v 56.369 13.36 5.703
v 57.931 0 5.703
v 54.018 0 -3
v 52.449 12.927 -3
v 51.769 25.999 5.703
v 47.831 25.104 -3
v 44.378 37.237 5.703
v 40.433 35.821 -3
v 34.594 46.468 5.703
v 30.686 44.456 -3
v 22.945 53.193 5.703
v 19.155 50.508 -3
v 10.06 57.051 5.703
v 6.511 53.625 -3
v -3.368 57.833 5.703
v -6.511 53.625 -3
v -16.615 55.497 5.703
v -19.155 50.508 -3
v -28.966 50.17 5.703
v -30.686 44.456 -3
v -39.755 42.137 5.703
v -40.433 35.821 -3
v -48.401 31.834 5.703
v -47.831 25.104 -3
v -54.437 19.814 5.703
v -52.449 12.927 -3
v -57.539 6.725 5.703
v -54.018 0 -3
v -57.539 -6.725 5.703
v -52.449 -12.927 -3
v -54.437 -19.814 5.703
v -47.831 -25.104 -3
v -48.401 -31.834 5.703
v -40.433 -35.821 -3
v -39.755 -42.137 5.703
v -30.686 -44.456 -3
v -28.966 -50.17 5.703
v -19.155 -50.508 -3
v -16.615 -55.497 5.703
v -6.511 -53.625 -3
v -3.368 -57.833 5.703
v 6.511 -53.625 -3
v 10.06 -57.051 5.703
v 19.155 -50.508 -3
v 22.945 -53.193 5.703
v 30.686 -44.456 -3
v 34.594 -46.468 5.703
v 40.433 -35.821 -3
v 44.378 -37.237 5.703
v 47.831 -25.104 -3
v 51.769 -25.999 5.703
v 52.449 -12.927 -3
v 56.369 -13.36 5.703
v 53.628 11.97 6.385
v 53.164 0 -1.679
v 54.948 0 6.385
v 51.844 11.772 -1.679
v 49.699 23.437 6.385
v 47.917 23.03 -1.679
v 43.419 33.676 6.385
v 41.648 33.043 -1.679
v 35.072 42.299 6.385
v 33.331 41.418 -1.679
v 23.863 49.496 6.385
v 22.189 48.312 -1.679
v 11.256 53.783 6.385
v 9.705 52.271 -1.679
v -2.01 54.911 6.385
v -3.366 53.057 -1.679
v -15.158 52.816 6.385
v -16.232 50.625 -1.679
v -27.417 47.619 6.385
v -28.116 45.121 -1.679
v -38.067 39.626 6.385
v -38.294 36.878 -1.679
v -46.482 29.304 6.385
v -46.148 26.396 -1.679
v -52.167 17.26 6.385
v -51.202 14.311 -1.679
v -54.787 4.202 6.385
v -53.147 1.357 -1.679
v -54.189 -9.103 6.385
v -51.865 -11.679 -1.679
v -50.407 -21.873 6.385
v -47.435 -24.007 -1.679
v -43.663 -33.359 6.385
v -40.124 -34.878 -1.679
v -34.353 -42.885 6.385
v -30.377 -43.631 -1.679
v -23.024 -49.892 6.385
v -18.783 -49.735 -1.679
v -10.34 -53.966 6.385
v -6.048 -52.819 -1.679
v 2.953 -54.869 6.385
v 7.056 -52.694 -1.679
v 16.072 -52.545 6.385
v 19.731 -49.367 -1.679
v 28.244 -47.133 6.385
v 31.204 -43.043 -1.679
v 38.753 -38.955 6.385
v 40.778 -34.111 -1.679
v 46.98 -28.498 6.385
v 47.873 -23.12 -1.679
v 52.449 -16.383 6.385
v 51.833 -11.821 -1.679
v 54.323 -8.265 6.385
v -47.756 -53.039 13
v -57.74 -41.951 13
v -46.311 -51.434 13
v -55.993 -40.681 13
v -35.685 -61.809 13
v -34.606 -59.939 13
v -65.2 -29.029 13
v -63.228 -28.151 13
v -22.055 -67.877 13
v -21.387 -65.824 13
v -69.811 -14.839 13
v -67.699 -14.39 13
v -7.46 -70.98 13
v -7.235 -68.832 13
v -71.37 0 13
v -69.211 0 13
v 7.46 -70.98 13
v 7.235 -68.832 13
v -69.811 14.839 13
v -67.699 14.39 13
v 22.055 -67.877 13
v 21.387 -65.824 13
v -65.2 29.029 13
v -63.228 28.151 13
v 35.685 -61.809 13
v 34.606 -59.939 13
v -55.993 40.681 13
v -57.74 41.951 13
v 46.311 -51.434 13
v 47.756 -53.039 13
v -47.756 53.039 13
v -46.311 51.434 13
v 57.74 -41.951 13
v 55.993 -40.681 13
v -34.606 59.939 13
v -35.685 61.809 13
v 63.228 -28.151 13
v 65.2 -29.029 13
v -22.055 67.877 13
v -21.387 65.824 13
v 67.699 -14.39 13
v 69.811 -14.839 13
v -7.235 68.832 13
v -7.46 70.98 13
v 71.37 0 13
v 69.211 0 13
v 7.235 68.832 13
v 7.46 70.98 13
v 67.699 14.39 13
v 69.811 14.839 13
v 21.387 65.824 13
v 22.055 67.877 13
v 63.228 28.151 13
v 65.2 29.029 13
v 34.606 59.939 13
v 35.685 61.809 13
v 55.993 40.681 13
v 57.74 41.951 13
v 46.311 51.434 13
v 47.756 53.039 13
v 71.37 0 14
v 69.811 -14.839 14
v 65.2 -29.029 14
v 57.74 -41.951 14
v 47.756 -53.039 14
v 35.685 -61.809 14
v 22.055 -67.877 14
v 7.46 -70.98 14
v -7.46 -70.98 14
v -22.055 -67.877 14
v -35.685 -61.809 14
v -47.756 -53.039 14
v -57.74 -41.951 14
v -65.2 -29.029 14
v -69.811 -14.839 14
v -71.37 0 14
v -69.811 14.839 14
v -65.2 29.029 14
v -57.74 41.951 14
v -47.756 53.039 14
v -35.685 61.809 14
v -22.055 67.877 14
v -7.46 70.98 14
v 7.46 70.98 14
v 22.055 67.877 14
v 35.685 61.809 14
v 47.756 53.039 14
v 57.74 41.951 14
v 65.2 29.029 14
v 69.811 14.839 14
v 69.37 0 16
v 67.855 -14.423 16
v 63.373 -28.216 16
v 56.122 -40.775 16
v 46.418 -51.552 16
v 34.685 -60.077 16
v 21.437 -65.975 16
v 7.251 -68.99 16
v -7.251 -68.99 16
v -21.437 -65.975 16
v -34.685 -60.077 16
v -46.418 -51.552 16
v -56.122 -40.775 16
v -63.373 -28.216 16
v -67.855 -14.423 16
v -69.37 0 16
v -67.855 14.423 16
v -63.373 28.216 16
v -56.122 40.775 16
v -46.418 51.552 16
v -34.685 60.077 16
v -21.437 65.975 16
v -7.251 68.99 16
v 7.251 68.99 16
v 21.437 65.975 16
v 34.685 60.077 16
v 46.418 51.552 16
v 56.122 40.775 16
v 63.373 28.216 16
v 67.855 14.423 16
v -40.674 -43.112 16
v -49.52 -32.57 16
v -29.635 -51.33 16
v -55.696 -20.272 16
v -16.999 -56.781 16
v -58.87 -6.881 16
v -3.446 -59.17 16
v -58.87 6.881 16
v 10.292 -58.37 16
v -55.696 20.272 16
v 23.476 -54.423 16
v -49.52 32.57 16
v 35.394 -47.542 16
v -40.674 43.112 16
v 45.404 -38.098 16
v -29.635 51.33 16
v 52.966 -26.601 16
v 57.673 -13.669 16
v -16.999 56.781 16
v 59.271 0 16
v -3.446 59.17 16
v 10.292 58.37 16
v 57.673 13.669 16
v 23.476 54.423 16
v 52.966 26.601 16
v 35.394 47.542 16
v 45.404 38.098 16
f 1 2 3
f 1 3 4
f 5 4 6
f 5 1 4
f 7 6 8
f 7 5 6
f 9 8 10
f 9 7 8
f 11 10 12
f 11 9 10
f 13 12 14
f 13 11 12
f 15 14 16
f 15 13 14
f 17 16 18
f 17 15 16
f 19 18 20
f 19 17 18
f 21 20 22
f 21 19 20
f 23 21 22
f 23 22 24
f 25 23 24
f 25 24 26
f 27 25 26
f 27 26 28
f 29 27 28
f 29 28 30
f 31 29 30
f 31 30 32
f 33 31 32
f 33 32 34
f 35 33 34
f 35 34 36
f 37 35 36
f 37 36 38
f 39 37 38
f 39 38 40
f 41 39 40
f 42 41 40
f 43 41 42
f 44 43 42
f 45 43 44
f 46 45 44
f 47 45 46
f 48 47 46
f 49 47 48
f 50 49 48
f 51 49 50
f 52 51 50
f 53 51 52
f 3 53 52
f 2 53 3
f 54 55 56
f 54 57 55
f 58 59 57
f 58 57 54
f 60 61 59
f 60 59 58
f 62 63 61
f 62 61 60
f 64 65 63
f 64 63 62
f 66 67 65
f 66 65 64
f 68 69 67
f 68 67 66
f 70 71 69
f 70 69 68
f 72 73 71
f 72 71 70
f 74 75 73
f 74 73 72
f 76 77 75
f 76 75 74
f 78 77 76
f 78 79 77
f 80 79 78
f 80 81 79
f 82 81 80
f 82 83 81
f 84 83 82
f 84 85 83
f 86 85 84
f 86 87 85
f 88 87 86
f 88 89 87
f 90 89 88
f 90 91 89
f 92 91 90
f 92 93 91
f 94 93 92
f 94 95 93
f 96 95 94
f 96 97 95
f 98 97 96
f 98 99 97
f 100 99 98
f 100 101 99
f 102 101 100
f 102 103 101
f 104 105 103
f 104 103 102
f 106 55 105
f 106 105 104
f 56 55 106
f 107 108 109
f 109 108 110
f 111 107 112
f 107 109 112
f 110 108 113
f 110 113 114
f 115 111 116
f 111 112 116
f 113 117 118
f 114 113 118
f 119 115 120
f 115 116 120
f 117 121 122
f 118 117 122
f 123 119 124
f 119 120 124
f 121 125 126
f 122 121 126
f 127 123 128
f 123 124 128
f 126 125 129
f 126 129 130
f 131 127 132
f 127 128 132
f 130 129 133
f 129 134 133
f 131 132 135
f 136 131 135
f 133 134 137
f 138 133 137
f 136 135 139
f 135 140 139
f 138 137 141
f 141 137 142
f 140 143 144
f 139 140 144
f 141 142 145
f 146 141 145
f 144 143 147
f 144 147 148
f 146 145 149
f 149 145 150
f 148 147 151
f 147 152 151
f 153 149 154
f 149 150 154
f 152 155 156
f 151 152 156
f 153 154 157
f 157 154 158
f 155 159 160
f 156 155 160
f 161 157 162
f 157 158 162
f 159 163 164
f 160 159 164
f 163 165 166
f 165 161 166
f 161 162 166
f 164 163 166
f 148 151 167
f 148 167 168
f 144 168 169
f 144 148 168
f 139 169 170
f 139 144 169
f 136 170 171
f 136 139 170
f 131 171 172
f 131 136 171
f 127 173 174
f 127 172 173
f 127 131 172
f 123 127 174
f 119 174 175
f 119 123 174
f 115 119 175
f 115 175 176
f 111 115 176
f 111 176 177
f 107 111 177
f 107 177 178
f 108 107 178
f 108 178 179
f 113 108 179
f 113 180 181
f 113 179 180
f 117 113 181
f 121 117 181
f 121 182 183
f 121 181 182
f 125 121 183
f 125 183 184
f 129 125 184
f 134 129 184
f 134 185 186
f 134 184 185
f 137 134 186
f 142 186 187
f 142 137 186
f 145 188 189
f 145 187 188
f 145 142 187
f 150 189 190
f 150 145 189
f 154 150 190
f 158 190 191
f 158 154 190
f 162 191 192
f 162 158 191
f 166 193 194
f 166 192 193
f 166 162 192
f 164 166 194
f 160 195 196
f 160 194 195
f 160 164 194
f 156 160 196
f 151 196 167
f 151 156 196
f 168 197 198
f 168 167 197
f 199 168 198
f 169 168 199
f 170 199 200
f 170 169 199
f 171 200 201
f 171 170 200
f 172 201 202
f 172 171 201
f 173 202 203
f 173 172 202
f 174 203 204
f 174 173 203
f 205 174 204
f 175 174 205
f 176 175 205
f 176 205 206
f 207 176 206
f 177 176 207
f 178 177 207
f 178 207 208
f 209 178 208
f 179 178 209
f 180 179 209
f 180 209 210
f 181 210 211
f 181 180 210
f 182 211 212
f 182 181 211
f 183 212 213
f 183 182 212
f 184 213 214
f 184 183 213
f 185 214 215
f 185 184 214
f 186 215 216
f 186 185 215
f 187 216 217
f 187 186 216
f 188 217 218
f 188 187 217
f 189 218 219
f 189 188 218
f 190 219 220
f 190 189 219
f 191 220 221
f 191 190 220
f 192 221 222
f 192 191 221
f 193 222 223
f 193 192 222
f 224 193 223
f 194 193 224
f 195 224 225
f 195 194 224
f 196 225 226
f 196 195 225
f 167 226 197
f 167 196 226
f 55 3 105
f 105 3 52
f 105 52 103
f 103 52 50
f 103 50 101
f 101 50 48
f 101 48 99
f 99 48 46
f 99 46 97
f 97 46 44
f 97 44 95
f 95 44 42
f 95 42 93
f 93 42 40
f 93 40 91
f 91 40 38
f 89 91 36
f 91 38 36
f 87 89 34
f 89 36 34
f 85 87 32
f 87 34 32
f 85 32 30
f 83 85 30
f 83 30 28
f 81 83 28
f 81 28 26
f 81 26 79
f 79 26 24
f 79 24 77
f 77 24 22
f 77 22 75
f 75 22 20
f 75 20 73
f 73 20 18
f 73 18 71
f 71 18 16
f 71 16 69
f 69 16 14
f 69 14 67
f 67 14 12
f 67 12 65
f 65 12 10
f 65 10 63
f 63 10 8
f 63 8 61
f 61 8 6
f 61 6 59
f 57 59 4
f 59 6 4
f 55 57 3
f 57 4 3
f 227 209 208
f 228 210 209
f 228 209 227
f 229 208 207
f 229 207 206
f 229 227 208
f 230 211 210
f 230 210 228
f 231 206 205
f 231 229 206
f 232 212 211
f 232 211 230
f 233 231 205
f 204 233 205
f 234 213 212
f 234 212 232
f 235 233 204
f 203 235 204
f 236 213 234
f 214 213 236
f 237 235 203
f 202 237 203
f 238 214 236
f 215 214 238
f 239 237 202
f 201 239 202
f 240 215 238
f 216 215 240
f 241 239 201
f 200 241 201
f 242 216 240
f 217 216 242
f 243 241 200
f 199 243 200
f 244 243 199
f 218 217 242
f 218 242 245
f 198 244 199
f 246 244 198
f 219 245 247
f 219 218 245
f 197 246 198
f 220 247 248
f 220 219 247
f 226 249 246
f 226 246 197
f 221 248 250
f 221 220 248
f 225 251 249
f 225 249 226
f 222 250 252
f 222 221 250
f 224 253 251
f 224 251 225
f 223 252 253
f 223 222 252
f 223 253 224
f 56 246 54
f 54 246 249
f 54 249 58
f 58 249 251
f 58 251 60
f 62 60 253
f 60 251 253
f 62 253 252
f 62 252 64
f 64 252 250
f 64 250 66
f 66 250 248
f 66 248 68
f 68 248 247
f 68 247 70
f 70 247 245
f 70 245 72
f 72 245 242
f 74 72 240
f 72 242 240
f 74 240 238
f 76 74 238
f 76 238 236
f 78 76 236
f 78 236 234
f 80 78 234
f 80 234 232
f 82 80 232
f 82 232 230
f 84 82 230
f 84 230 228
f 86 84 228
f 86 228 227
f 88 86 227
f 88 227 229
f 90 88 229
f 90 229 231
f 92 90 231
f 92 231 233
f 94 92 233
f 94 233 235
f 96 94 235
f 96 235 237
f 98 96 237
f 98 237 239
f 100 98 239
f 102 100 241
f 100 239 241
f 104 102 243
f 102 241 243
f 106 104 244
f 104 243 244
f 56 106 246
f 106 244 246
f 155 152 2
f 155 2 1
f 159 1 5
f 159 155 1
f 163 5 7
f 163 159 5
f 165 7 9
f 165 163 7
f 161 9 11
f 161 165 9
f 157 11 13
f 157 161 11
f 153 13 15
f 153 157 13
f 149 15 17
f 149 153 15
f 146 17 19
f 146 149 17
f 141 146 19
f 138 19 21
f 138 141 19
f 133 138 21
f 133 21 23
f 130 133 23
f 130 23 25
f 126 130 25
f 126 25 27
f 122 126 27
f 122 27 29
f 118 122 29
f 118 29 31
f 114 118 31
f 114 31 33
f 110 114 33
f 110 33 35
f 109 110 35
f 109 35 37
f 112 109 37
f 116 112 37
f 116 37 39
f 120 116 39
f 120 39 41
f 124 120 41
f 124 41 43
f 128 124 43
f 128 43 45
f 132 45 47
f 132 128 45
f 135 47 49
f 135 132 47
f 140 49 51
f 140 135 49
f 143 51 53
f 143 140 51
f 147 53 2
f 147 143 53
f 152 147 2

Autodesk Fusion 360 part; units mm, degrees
sketch "Sketch1" plane through (0, 0, 0) normal (0, 1, 0) x (1, 0, 0)
  line L0 (0, 0) -> (52.0778, 0)
  line L1 (52.0778, 0) -> (59.2706, -16)
  line L2 (59.2706, -16) -> (71.3705, -16)
  line L3 (0, 3) -> (54.0184, 3)
  line L4 (54.0184, 3) -> (61.2112, -13)
  line L5 (61.2112, -13) -> (71.3705, -13)
  line L6 (71.3705, -16) -> (71.3705, -13)
  line L7 (52.0778, 0) -> (54.0184, 3)
  dimension "d1" = -3
revolve "Revolve1" add sketch "Sketch1" angle 360 about axis through (0, 0, 1.75) along (0, 0, 1)
chamfer "Chamfer1" distance 2 distance2 7 1 edges at (-48.5536, -18.8321, 0) measured on face at (53.1063, -5.3141, -2)
chamfer "Chamfer2" distance 2 distance2 2 1 edges at (-66.5407, -25.8087, 16) measured on face at (67.0715, -3.5457, 16)
chamfer "Chamfer3" distance 8 distance2 8 1 edges at (-57.0689, -22.1349, 13) measured on face at (67.7183, -3.5457, 13)
